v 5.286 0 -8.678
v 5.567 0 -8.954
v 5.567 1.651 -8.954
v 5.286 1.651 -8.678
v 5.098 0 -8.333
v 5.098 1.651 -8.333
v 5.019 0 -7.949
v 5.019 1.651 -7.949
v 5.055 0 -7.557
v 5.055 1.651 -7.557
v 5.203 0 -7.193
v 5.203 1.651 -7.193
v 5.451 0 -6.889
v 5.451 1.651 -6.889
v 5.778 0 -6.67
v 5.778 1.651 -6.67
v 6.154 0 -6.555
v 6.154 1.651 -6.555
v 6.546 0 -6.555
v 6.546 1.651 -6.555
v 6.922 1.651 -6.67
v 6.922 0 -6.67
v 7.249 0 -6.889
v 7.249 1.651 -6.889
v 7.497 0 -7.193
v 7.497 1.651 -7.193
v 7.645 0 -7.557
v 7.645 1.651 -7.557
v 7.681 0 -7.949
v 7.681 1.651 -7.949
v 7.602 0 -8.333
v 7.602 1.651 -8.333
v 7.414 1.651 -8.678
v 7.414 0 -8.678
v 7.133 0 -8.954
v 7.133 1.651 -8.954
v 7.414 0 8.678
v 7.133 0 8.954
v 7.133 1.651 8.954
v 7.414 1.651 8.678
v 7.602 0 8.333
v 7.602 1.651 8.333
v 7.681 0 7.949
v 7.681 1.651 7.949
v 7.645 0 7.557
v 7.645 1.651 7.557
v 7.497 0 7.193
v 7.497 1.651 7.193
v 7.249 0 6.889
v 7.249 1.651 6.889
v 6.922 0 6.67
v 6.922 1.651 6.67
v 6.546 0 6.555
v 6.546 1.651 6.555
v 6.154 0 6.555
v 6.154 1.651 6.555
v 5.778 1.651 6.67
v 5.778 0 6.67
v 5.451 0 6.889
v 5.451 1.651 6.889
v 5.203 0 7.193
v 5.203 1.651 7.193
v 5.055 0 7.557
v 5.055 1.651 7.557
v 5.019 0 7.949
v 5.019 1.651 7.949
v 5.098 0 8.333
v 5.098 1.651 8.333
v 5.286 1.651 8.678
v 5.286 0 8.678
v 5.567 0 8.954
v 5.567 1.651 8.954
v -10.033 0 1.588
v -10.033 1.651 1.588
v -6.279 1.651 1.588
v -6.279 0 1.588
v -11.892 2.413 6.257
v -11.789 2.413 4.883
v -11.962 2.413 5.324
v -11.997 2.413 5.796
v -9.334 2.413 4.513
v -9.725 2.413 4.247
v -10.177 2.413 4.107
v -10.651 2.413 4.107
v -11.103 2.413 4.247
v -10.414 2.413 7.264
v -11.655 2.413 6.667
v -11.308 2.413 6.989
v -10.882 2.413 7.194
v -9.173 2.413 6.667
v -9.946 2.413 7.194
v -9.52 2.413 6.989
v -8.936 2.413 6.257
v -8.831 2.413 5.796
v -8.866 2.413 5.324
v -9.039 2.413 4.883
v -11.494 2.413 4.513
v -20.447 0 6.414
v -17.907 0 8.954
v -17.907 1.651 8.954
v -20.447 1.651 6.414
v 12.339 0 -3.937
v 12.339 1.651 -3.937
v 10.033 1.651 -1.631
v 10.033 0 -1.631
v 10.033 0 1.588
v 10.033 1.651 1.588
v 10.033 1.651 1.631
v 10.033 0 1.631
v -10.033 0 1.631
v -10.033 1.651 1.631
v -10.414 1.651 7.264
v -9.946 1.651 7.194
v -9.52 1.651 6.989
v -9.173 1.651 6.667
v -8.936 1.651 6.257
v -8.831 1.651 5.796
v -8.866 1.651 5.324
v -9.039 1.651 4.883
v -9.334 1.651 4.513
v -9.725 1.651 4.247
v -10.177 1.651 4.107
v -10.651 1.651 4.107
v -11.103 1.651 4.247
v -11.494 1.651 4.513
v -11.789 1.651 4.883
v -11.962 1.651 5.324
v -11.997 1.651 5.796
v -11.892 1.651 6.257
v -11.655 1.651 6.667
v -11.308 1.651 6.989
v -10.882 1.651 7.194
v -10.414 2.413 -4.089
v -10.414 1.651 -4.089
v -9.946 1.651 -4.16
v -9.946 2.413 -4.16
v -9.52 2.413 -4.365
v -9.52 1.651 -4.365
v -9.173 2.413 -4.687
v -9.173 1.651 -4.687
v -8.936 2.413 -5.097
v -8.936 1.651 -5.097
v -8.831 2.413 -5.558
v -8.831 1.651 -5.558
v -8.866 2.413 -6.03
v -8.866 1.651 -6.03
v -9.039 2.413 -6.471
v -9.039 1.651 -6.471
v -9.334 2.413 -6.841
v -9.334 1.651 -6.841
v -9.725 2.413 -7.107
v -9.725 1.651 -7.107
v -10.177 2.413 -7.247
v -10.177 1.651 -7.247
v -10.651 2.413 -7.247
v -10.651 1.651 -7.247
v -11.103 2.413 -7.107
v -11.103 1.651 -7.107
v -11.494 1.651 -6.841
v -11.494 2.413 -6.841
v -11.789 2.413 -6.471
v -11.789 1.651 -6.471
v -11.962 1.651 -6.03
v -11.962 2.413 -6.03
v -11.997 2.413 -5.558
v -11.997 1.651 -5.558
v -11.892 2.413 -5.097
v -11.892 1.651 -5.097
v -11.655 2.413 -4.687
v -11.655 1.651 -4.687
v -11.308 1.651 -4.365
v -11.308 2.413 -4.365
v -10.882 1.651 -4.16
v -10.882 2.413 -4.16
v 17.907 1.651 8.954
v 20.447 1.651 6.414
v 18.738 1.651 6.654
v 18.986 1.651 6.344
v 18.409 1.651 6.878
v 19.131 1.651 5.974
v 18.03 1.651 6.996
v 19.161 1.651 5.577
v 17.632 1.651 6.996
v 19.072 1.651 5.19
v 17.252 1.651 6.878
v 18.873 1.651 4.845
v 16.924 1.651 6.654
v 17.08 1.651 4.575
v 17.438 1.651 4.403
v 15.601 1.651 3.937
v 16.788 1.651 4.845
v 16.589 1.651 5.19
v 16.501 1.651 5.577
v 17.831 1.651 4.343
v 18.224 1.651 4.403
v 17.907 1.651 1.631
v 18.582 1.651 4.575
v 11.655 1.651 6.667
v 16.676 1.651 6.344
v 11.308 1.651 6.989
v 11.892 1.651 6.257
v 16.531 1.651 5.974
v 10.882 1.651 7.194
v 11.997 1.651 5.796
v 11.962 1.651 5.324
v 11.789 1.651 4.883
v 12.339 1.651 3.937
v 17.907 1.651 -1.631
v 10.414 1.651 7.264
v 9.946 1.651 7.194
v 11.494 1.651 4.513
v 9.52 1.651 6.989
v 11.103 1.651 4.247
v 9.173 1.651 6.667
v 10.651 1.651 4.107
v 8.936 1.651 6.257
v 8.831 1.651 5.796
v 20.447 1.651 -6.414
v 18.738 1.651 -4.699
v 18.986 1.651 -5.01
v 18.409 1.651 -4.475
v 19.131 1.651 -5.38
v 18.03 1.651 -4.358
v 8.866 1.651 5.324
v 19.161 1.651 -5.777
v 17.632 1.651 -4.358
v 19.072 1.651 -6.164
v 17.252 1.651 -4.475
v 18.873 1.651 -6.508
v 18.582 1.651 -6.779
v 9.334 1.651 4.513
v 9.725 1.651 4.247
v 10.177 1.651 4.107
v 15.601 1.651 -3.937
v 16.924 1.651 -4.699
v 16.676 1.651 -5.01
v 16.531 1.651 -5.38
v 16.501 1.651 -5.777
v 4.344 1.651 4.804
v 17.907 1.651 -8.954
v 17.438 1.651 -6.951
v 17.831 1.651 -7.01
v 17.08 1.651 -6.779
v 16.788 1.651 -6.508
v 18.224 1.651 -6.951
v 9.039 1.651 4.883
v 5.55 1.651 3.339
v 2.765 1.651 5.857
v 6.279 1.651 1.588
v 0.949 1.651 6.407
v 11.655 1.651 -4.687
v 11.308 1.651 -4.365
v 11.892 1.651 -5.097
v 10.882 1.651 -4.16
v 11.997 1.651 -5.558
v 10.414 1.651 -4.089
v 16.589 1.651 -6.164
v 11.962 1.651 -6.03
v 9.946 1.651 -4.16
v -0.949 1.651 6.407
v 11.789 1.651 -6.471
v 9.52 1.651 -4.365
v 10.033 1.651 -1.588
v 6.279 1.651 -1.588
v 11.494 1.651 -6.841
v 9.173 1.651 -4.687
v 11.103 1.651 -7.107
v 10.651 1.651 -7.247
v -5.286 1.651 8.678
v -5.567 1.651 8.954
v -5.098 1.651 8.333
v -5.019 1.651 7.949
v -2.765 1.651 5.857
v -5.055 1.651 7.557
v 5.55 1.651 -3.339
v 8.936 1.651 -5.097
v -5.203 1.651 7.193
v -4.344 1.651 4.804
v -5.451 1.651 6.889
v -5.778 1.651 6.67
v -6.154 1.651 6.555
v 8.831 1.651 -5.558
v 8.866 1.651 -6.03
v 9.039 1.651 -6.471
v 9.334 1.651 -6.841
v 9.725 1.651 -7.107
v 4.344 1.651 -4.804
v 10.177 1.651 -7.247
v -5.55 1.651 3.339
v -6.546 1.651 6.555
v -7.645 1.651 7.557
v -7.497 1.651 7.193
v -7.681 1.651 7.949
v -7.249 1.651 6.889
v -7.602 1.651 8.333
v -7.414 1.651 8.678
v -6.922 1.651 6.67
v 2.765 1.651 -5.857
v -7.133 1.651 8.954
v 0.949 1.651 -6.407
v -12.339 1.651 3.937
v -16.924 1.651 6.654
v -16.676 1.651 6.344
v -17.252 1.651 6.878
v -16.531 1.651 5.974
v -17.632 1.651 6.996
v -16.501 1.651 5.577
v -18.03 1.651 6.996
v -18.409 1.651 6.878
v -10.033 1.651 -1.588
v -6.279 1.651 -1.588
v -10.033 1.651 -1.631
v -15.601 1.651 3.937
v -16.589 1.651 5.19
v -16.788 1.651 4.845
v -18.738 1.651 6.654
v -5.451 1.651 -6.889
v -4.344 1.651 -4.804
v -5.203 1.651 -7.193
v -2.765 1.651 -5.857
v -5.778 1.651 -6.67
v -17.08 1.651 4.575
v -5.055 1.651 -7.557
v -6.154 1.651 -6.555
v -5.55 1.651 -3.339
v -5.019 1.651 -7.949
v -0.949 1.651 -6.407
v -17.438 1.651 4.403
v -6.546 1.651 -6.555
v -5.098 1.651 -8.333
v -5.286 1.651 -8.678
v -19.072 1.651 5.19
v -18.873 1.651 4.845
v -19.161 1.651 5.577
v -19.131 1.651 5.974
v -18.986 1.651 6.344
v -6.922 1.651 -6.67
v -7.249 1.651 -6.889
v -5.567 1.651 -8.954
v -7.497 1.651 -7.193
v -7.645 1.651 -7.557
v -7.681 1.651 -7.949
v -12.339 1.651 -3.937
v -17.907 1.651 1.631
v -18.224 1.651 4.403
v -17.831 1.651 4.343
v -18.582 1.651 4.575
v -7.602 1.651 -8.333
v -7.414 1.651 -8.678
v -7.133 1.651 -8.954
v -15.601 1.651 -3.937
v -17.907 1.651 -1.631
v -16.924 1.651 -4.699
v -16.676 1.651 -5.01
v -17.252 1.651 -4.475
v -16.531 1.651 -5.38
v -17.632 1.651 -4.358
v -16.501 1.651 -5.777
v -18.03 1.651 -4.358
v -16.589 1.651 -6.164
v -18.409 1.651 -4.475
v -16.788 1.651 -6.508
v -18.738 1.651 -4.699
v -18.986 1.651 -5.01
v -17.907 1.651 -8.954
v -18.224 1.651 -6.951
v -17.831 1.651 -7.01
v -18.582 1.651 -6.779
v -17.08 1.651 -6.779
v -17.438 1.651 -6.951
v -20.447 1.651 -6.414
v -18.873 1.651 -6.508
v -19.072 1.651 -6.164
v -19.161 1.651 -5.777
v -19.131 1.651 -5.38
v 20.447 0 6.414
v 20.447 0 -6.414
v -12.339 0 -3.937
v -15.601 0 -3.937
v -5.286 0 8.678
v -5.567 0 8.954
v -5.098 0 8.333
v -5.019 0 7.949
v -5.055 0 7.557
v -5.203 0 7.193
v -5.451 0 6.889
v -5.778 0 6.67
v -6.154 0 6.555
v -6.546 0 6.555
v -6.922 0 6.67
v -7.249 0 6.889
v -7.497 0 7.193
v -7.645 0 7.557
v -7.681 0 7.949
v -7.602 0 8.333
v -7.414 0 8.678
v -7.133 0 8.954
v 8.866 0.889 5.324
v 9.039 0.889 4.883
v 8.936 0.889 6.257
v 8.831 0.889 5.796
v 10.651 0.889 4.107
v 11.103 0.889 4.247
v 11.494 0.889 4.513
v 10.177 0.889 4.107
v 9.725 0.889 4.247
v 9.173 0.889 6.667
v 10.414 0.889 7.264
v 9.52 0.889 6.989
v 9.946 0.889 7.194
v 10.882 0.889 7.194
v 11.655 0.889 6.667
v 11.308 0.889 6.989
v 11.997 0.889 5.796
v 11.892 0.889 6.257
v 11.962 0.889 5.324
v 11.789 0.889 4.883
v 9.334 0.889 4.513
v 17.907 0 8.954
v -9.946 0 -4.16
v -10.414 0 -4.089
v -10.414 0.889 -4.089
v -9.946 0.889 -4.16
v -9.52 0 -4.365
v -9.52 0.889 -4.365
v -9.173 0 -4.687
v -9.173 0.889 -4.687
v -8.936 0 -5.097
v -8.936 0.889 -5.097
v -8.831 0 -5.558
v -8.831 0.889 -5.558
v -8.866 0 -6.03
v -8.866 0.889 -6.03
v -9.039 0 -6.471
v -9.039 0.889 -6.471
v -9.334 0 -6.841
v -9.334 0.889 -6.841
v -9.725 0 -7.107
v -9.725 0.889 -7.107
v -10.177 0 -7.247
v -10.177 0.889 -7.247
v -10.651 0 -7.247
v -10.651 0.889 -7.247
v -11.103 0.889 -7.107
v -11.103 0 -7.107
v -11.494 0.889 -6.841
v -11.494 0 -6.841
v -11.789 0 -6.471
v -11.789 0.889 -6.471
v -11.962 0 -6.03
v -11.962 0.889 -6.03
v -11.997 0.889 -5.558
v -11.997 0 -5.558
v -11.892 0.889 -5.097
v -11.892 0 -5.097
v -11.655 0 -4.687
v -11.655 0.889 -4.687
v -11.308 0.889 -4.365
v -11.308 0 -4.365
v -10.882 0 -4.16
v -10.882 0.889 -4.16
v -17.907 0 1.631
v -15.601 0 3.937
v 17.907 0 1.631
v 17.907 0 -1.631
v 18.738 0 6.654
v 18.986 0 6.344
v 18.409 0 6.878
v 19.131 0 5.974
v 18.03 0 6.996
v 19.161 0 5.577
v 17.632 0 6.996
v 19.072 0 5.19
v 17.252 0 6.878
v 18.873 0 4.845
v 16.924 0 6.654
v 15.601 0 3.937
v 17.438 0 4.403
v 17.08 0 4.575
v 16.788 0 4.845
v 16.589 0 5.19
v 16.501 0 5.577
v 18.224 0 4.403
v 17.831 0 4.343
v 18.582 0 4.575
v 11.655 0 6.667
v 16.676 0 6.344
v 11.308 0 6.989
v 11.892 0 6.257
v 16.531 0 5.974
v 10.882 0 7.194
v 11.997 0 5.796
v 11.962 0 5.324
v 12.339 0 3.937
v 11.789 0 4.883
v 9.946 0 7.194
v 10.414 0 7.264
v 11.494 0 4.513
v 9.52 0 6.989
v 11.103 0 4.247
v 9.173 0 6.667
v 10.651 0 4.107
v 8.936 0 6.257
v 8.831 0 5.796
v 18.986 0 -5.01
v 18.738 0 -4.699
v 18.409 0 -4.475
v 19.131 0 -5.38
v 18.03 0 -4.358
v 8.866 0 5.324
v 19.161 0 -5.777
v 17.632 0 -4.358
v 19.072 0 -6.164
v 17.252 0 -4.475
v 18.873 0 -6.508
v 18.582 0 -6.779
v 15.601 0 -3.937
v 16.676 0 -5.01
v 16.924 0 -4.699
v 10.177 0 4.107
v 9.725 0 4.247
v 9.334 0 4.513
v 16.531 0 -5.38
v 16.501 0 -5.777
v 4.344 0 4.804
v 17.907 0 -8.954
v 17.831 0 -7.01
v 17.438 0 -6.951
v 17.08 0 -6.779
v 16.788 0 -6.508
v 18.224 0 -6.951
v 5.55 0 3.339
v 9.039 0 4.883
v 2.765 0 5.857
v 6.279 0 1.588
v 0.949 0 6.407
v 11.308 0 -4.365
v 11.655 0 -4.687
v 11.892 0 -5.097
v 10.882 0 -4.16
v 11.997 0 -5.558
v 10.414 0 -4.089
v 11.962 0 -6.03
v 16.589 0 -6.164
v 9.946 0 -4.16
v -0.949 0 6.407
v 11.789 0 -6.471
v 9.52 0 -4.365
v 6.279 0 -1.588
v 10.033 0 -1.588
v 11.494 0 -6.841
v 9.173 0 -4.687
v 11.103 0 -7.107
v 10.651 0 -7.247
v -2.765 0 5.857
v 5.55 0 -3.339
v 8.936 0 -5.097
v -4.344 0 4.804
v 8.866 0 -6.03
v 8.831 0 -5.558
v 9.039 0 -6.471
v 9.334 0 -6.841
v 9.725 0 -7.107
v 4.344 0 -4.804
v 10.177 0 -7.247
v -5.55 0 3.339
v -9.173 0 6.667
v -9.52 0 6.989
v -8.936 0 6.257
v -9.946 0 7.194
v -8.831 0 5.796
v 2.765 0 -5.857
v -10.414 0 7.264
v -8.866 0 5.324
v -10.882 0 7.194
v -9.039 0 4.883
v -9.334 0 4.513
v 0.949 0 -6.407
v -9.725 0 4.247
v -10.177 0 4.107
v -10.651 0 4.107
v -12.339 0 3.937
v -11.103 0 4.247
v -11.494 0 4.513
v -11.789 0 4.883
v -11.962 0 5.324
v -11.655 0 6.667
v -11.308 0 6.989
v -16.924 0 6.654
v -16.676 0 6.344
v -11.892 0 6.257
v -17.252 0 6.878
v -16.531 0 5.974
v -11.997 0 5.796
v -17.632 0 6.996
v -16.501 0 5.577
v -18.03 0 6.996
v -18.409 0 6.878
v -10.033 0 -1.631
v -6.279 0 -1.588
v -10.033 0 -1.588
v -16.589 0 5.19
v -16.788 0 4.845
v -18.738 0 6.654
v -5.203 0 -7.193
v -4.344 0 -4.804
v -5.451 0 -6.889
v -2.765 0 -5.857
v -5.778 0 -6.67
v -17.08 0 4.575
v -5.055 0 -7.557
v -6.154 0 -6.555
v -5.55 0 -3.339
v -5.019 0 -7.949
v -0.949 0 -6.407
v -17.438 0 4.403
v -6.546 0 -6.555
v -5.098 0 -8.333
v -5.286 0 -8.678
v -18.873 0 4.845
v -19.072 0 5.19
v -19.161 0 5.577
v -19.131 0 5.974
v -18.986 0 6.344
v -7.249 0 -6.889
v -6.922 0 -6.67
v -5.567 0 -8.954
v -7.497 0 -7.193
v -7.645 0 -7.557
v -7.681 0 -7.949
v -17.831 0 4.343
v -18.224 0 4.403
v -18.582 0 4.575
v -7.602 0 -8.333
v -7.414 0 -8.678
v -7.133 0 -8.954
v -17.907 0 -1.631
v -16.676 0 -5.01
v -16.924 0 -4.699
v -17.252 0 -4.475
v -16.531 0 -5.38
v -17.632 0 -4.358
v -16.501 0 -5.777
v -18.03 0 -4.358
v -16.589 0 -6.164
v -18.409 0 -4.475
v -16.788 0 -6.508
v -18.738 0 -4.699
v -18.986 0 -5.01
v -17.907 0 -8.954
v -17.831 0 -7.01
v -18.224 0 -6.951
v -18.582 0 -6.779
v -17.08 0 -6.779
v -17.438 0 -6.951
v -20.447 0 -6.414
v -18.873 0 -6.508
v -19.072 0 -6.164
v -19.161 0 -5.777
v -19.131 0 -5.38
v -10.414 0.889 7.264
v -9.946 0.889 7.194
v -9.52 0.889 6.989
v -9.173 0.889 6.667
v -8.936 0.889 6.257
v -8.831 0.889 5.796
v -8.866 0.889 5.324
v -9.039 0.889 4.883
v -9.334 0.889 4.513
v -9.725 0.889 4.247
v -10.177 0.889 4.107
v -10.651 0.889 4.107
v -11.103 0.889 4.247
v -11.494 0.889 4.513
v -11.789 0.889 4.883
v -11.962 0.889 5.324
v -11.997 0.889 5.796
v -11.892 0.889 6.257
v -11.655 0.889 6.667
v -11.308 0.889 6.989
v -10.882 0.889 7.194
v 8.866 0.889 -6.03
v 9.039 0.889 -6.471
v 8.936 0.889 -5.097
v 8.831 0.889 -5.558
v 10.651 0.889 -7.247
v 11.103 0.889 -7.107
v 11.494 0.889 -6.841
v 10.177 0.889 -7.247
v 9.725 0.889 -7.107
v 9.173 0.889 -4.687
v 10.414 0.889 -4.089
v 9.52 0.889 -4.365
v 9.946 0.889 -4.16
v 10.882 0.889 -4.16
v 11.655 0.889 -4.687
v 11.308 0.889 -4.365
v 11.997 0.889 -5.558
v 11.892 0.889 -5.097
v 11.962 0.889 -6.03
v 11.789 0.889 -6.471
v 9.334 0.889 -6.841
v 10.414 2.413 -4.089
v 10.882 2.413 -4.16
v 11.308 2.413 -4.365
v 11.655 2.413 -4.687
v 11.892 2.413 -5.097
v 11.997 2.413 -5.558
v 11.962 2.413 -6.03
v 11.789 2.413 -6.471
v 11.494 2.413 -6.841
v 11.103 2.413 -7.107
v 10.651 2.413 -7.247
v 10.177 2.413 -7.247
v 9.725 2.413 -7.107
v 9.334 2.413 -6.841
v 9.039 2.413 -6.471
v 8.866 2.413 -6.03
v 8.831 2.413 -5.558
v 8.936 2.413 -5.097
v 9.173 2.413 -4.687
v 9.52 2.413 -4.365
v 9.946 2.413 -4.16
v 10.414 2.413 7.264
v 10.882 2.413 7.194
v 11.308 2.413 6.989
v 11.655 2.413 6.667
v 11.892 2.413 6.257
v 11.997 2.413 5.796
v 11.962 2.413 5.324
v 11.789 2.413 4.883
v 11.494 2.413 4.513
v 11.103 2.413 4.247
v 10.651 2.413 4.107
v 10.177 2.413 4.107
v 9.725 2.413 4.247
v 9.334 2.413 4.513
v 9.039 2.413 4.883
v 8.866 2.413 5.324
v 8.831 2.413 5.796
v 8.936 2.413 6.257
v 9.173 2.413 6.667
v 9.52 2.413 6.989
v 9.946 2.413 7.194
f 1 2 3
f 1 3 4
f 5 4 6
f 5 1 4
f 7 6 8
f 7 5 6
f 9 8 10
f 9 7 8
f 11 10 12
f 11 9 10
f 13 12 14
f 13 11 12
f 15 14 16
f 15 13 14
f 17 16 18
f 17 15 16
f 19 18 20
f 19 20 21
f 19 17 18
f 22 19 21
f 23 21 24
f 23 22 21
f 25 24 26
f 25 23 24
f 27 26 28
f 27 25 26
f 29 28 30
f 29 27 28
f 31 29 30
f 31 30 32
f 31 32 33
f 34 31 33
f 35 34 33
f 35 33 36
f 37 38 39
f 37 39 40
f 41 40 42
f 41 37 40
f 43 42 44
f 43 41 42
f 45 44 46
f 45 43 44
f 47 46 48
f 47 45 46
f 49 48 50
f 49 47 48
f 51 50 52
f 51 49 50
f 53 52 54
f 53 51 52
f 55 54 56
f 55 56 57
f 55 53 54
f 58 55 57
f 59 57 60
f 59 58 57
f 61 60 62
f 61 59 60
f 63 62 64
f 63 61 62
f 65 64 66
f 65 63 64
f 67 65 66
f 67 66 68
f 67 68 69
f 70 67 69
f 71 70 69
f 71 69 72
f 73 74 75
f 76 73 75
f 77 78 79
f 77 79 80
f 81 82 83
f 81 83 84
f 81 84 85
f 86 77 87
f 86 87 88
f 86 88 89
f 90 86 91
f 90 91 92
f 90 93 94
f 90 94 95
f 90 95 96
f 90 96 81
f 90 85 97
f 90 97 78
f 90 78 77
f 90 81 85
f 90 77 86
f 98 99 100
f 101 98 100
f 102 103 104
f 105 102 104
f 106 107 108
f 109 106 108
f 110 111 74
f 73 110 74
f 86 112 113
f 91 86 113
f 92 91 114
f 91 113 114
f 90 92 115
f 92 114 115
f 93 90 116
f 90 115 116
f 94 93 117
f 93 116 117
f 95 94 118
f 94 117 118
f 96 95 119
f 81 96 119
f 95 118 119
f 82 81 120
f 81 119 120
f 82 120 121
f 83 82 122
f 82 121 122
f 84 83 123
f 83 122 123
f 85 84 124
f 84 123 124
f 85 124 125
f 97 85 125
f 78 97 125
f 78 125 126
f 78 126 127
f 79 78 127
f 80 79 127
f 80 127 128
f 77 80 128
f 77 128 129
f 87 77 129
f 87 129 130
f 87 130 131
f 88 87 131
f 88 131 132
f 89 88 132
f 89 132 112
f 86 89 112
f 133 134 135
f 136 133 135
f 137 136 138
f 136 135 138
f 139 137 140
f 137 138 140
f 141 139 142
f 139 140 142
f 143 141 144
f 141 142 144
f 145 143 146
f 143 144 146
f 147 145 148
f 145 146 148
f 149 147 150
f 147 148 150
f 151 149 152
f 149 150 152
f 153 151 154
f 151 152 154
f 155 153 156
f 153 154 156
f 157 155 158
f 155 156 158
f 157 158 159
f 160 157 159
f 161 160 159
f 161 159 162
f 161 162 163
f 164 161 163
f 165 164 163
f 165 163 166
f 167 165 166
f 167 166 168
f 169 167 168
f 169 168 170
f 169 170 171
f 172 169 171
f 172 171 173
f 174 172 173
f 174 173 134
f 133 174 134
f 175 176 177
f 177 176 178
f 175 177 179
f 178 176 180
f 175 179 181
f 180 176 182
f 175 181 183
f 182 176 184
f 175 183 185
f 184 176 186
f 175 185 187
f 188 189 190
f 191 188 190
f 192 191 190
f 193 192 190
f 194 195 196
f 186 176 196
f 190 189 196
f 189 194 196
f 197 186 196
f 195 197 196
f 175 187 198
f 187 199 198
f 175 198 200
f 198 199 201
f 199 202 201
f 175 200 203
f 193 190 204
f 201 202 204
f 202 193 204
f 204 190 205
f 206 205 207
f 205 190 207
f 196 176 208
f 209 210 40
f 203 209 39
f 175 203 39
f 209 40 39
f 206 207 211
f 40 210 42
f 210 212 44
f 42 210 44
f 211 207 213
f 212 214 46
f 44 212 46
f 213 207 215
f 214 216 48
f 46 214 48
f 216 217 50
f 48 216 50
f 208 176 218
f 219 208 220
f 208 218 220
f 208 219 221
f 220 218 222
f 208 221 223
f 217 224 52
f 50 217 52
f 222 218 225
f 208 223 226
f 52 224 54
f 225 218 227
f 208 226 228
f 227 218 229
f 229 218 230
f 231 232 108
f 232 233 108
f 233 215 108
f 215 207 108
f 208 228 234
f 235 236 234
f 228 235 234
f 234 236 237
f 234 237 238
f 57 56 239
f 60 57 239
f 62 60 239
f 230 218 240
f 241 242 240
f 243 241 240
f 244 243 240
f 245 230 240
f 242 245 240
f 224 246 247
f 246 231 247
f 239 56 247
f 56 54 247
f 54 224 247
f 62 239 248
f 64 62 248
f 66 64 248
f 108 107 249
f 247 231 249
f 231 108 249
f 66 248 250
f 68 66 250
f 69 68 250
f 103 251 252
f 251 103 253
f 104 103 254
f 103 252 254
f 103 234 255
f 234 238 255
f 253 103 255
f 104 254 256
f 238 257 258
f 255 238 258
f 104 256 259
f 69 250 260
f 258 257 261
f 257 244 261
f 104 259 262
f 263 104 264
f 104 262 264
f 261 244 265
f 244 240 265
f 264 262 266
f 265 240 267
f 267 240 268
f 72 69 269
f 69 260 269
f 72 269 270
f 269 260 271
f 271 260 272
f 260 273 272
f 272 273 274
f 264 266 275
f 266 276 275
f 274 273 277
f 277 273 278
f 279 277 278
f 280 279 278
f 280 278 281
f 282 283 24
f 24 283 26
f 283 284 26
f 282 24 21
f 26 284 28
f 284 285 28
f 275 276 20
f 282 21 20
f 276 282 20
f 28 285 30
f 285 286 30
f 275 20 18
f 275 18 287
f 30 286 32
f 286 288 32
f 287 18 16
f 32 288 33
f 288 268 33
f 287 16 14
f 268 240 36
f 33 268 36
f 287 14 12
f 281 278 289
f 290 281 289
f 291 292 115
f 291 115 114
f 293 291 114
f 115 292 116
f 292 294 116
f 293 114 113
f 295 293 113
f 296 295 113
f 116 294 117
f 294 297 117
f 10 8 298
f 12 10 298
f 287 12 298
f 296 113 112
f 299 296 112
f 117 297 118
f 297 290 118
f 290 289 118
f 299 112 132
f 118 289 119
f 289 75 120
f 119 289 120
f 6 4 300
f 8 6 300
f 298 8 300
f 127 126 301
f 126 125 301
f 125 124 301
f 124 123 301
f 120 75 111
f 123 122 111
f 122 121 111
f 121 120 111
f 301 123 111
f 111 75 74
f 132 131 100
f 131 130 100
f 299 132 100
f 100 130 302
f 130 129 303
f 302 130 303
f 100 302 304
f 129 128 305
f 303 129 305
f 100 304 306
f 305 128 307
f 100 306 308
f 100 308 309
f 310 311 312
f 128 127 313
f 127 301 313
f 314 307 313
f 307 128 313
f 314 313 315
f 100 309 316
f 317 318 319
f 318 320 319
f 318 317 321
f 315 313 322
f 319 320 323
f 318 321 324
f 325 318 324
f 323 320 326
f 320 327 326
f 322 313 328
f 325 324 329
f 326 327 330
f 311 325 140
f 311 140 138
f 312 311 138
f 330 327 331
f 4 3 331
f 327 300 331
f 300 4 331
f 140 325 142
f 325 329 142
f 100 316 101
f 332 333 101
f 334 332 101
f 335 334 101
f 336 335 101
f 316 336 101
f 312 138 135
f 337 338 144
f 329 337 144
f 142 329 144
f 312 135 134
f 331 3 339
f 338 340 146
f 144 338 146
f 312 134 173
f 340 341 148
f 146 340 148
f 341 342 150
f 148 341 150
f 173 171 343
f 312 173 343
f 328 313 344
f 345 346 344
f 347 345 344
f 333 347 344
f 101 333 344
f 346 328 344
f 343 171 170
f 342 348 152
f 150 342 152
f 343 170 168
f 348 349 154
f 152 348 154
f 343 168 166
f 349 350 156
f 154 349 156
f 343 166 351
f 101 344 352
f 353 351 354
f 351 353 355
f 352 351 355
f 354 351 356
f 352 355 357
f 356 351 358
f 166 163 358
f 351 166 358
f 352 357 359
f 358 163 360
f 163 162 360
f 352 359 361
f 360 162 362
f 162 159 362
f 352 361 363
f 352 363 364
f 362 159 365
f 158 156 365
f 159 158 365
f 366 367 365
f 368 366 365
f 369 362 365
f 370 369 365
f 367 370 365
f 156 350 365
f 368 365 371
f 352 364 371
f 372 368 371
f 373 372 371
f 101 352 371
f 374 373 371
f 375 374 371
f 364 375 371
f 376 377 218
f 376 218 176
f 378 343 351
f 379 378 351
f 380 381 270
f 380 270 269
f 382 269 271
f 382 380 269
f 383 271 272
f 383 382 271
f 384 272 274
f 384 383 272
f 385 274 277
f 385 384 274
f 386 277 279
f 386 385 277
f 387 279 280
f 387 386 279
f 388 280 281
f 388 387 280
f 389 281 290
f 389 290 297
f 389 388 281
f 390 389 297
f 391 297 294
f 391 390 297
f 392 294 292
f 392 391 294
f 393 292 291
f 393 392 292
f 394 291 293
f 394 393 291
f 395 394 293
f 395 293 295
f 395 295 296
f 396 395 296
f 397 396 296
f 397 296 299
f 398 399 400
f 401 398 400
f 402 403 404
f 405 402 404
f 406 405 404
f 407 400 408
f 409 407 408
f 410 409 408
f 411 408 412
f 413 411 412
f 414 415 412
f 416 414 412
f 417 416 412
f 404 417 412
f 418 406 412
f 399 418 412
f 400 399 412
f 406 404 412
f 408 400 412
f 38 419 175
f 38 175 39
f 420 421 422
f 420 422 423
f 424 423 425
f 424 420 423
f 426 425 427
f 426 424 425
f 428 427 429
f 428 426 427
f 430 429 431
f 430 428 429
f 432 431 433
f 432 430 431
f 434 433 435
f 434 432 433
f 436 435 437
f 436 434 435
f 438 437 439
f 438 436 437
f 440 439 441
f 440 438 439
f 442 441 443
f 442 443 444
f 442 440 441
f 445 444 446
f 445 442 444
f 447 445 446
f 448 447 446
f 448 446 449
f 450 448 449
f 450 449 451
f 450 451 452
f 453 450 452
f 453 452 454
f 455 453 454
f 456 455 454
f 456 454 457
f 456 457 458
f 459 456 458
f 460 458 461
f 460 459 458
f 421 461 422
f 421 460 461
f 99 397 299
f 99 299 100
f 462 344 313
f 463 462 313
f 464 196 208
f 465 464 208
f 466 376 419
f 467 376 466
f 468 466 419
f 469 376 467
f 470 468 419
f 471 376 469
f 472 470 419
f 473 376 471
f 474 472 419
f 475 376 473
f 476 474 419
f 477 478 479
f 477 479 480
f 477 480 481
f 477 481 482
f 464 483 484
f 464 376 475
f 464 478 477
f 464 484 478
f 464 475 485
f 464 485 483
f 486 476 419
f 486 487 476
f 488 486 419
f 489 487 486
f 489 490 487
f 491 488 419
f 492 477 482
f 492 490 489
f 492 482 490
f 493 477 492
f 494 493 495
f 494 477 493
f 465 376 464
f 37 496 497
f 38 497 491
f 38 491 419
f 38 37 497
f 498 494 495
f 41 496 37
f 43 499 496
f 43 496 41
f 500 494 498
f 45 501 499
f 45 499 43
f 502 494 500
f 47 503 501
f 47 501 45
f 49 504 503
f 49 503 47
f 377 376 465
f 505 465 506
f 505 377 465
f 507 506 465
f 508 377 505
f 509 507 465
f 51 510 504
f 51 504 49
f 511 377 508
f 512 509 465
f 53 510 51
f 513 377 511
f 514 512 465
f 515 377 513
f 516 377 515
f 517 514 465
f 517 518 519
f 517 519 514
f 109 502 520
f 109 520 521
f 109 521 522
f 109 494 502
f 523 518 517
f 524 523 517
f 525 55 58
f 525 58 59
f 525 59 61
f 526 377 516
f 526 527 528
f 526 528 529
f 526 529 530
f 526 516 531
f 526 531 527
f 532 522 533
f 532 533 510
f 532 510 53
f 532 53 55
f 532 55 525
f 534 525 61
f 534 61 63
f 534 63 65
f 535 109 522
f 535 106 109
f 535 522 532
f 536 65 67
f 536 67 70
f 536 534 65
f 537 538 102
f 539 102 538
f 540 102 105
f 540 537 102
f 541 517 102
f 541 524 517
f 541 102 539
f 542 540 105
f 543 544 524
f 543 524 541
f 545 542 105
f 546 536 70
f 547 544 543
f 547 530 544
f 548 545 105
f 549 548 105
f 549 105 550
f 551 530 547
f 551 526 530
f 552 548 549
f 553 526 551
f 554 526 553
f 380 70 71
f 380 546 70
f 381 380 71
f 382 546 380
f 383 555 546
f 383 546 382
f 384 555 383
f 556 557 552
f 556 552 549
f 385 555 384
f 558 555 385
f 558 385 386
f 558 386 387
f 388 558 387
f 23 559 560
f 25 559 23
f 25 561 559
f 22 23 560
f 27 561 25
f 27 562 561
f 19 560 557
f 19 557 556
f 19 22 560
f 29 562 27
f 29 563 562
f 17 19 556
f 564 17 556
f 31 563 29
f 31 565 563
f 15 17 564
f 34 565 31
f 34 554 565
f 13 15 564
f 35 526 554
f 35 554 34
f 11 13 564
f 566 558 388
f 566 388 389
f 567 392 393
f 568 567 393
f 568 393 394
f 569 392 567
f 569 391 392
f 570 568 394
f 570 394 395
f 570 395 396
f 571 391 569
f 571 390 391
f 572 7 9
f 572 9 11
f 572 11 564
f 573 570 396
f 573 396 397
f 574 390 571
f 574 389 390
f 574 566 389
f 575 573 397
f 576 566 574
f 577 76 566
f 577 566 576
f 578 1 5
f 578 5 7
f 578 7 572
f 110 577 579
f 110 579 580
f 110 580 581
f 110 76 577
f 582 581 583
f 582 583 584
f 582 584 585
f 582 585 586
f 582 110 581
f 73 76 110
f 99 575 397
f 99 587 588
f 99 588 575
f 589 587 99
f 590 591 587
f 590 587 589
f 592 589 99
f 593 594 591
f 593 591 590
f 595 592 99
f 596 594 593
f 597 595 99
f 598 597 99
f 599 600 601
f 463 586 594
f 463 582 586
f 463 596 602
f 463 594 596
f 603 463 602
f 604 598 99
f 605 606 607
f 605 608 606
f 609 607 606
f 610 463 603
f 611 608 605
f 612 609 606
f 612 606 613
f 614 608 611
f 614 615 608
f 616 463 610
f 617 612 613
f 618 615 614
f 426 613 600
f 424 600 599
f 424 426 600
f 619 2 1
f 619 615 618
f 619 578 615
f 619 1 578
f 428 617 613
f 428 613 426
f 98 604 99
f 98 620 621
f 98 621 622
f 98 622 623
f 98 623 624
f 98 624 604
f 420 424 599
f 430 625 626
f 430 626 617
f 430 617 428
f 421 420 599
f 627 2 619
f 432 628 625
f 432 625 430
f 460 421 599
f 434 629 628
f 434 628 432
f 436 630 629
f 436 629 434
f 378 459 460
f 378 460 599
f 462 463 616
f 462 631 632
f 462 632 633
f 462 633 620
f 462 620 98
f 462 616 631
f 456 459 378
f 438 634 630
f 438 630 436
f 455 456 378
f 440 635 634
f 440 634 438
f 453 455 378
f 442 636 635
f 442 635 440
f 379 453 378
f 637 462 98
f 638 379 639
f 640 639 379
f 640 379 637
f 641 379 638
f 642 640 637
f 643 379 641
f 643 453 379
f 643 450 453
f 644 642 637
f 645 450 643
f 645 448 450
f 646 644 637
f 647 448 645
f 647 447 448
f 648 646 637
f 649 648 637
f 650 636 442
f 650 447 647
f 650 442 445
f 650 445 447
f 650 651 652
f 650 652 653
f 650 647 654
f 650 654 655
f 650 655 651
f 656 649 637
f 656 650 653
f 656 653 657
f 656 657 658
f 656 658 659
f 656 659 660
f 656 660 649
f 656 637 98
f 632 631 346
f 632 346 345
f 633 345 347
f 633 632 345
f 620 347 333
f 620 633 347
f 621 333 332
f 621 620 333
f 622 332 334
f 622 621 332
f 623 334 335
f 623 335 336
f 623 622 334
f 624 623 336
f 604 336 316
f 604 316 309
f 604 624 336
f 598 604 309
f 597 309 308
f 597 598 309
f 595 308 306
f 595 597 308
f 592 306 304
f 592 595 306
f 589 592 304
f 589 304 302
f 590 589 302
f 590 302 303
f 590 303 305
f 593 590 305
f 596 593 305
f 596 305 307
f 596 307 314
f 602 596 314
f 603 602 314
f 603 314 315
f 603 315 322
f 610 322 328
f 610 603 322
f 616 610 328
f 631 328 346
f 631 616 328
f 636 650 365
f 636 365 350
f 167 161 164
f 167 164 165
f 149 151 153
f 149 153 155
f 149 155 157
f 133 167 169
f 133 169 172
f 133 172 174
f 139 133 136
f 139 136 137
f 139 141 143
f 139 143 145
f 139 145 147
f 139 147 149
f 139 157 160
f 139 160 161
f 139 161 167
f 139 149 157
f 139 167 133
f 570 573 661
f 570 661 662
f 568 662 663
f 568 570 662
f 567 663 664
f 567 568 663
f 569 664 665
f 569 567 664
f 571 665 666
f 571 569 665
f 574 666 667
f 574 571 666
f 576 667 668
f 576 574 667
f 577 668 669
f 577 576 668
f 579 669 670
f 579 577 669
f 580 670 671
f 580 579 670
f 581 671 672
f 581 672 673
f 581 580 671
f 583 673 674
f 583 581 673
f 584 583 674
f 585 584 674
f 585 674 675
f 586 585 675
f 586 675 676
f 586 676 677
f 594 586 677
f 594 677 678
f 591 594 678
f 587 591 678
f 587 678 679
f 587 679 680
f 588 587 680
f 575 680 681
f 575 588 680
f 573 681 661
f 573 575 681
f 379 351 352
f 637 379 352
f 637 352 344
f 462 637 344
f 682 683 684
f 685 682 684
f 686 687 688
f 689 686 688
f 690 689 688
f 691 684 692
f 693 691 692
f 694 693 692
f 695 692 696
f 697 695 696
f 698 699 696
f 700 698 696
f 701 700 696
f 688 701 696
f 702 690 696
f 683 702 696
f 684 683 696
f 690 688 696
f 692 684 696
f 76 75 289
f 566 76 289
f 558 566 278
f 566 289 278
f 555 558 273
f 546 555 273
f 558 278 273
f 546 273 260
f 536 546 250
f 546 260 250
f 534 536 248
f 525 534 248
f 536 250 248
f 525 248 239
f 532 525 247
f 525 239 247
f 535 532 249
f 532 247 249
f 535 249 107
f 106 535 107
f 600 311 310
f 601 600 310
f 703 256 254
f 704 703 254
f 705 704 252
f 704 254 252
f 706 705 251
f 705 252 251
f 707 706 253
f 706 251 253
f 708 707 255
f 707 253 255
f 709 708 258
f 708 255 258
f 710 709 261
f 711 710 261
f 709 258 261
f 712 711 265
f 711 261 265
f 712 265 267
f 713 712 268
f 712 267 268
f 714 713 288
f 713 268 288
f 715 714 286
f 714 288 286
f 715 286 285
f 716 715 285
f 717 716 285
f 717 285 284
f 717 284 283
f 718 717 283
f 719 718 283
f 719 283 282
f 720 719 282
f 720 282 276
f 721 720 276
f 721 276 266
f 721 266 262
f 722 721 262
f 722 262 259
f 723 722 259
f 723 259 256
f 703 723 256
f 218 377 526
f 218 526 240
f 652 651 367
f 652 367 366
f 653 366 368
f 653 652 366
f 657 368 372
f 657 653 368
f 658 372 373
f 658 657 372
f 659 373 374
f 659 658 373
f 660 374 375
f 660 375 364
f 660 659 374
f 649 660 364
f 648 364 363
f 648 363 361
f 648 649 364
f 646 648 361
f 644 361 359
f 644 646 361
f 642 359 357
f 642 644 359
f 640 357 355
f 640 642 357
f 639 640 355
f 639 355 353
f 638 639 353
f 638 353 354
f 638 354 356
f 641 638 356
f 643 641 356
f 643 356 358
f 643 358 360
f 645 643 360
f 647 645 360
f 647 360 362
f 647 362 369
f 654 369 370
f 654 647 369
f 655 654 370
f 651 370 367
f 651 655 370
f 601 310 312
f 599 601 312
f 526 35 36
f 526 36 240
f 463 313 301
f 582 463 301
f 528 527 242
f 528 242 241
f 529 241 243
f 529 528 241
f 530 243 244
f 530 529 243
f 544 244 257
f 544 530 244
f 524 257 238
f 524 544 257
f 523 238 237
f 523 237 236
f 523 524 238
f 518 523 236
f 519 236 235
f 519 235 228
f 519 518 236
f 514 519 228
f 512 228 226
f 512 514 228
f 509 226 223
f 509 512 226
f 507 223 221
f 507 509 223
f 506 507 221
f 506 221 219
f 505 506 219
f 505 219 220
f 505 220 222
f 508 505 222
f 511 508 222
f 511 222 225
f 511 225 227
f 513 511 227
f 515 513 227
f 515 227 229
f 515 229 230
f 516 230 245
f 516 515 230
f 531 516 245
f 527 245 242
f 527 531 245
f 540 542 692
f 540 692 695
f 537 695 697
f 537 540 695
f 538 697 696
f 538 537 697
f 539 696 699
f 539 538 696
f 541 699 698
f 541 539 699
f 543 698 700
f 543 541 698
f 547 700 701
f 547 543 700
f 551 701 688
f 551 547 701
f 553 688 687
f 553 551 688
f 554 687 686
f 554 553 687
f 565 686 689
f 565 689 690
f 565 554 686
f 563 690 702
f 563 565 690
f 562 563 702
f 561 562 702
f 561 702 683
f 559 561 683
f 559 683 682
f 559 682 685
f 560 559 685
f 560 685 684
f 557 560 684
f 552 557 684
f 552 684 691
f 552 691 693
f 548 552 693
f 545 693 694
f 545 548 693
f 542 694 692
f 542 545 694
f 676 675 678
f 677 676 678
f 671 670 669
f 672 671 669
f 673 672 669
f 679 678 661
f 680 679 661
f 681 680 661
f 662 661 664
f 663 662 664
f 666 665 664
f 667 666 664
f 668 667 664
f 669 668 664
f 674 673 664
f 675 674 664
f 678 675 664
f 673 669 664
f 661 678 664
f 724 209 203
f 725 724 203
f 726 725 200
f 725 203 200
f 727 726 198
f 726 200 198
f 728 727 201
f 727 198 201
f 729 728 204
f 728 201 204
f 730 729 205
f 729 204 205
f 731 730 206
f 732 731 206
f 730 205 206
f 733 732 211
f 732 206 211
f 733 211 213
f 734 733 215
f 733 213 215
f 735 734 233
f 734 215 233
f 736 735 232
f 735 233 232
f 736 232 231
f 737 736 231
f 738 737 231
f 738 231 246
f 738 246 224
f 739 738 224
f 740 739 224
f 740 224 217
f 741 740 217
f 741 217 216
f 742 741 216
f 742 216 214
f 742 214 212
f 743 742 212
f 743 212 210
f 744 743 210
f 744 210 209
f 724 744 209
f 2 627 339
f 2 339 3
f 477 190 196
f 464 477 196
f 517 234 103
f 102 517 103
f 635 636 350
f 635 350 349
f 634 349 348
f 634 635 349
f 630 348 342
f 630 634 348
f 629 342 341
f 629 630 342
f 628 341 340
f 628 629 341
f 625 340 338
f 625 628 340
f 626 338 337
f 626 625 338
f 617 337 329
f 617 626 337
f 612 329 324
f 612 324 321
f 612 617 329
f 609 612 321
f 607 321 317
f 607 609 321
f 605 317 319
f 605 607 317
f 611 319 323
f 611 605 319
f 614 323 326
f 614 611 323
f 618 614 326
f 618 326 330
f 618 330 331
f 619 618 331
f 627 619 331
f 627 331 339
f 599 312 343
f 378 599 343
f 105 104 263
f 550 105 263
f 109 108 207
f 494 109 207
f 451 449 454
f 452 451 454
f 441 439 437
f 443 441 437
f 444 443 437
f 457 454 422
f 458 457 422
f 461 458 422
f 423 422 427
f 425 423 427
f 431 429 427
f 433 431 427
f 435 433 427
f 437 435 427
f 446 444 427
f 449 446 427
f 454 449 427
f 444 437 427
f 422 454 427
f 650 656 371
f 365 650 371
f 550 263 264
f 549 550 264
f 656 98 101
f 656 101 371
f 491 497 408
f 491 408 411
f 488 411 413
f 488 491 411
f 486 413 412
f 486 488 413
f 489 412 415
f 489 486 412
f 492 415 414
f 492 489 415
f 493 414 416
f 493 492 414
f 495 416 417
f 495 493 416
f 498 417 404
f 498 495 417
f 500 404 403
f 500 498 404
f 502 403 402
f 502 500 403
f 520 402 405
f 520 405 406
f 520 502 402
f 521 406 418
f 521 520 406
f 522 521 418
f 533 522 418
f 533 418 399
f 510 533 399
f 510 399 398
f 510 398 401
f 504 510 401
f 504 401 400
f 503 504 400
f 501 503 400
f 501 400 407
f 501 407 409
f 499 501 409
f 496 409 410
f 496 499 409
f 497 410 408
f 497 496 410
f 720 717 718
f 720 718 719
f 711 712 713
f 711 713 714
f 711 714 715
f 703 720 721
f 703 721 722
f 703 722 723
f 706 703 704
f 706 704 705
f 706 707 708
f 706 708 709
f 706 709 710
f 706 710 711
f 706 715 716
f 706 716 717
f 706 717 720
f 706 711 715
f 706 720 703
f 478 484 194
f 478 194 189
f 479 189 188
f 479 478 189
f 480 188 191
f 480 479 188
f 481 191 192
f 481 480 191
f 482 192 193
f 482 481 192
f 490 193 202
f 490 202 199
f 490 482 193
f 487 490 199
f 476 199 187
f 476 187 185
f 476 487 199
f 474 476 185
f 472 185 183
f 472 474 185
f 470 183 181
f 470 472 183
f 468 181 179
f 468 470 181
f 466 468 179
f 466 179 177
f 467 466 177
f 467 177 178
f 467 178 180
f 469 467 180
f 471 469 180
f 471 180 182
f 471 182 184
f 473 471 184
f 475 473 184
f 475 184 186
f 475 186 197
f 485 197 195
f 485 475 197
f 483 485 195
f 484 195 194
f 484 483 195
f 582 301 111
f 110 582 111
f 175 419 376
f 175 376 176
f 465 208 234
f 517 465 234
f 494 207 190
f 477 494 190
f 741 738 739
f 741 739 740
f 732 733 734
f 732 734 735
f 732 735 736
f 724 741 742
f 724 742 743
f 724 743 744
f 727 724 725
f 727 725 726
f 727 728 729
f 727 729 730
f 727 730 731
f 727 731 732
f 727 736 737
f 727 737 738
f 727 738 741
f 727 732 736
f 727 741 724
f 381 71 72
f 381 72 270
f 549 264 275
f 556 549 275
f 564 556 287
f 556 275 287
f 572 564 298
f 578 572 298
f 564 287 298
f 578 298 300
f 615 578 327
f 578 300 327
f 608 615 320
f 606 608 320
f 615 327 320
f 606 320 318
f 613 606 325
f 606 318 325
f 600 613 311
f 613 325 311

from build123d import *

# Parameters (mm, degrees)
SKETCH1_R           = 1.3335
SKETCH1_R_2         = 1.5875
BOSS_EXTRUDE1_DEPTH = 1.651
CHAMFER1_SIZE       = 2.54
SKETCH1_2_R         = 1.5875
BOSS_EXTRUDE2_DEPTH = 2.413
SKETCH1_3_R         = 1.5875
CUT_EXTRUDE1_DEPTH  = 0.889
CUT_EXTRUDE2_DEPTH  = 23.382376376


with BuildPart() as part:
    # Sketch1 → Boss-Extrude1 (new body)
    with BuildSketch(Plane(origin=(0, 0, 0), x_dir=(1, 0, 0), z_dir=(0, 1, 0))):
        with BuildLine():
            Line((-5.567119422, 8.9535), (5.567119422, 8.9535))
            ThreePointArc((5.567119422, 8.9535), (6.35, 6.5405), (7.132880578, 8.9535))
            Line((7.132880578, 8.9535), (20.447, 8.9535))
            Line((20.447, 8.9535), (20.447, -8.9535))
            Line((20.447, -8.9535), (7.132880578, -8.9535))
            ThreePointArc((7.132880578, -8.9535), (6.35, -6.5405), (5.567119422, -8.9535))
            Line((5.567119422, -8.9535), (-5.567119422, -8.9535))
            ThreePointArc((-5.567119422, -8.9535), (-6.35, -6.5405), (-7.132880578, -8.9535))
            Line((-7.132880578, -8.9535), (-20.447, -8.9535))
            Line((-20.447, -8.9535), (-20.447, 8.9535))
            Line((-20.447, 8.9535), (-7.132880578, 8.9535))
            ThreePointArc((-7.132880578, 8.9535), (-6.35, 6.5405), (-5.567119422, 8.9535))
        make_face()
        with Locations((-17.8308, 5.6769)):
            Circle(SKETCH1_R, mode=Mode.SUBTRACT)
        with Locations((17.8308, 5.6769)):
            Circle(SKETCH1_R, mode=Mode.SUBTRACT)
        with Locations((17.8308, -5.6769)):
            Circle(SKETCH1_R, mode=Mode.SUBTRACT)
        with Locations((-17.8308, -5.6769)):
            Circle(SKETCH1_R, mode=Mode.SUBTRACT)
        with Locations((-10.414, 5.6769)):
            Circle(SKETCH1_R_2, mode=Mode.SUBTRACT)
        with Locations((10.414, 5.6769)):
            Circle(SKETCH1_R_2, mode=Mode.SUBTRACT)
        with Locations((10.414, -5.6769)):
            Circle(SKETCH1_R_2, mode=Mode.SUBTRACT)
        with Locations((-10.414, -5.6769)):
            Circle(SKETCH1_R_2, mode=Mode.SUBTRACT)
    extrude(amount=BOSS_EXTRUDE1_DEPTH)

    # Chamfer1
    chamfer1_edges = [part.edges().sort_by_distance(p)[0] for p in [
        (-20.447, 0.8255, 8.9535),
        (-20.447, 0.8255, -8.9535),
        (20.447, 0.8255, -8.9535),
        (20.447, 0.8255, 8.9535),
    ]]
    chamfer(chamfer1_edges, length=CHAMFER1_SIZE)

    # Sketch1<2> → Boss-Extrude2 (add)
    with BuildSketch(Plane(origin=(0, 0, 0), x_dir=(1, 0, 0), z_dir=(0, 1, 0))):
        with Locations((-10.414, 5.6769)):
            Circle(SKETCH1_2_R)
        with Locations((10.414, 5.6769)):
            Circle(SKETCH1_2_R)
        with Locations((10.414, -5.6769)):
            Circle(SKETCH1_2_R)
        with Locations((-10.414, -5.6769)):
            Circle(SKETCH1_2_R)
    extrude(amount=BOSS_EXTRUDE2_DEPTH)

    # Sketch1<3> → Cut-Extrude1 (cut)
    with BuildSketch(Plane(origin=(0, 0, 0), x_dir=(1, 0, 0), z_dir=(0, 1, 0))):
        with Locations((-10.414, 5.6769)):
            Circle(SKETCH1_3_R)
        with Locations((10.414, 5.6769)):
            Circle(SKETCH1_3_R)
        with Locations((10.414, -5.6769)):
            Circle(SKETCH1_3_R)
        with Locations((-10.414, -5.6769)):
            Circle(SKETCH1_3_R)
    extrude(amount=CUT_EXTRUDE1_DEPTH, mode=Mode.SUBTRACT)

    # Sketch2 → Cut-Extrude2 (cut, through all)
    with BuildSketch(Plane(origin=(0, 1.651, 0), x_dir=(1, 0, 0), z_dir=(0, 1, 0))):
        with BuildLine():
            Line((-10.033, 1.5875), (-10.033, 1.630758795))
            Line((-10.033, 1.630758795), (-12.339241205, 3.937))
            Line((-12.339241205, 3.937), (-15.600758795, 3.937))
            Line((-15.600758795, 3.937), (-17.907, 1.630758795))
            Line((-17.907, 1.630758795), (-17.907, -1.630758795))
            Line((-17.907, -1.630758795), (-15.600758795, -3.937))
            Line((-15.600758795, -3.937), (-12.339241205, -3.937))
            Line((-12.339241205, -3.937), (-10.033, -1.630758795))
            Line((-10.033, -1.630758795), (-10.033, -1.5875))
            Line((-10.033, -1.5875), (-6.279440481, -1.5875))
            ThreePointArc((-6.279440481, -1.5875), (0, -6.477), (6.279440481, -1.5875))
            Line((6.279440481, -1.5875), (10.033, -1.5875))
            Line((10.033, -1.5875), (10.033, -1.630758795))
            Line((10.033, -1.630758795), (12.339241205, -3.937))
            Line((12.339241205, -3.937), (15.600758795, -3.937))
            Line((15.600758795, -3.937), (17.907, -1.630758795))
            Line((17.907, -1.630758795), (17.907, 1.630758795))
            Line((17.907, 1.630758795), (15.600758795, 3.937))
            Line((15.600758795, 3.937), (12.339241205, 3.937))
            Line((12.339241205, 3.937), (10.033, 1.630758795))
            Line((10.033, 1.630758795), (10.033, 1.5875))
            Line((10.033, 1.5875), (6.279440481, 1.5875))
            ThreePointArc((6.279440481, 1.5875), (0, 6.477), (-6.279440481, 1.5875))
            Line((-6.279440481, 1.5875), (-10.033, 1.5875))
        make_face()
    extrude(amount=-CUT_EXTRUDE2_DEPTH, mode=Mode.SUBTRACT)


solid = part.part
